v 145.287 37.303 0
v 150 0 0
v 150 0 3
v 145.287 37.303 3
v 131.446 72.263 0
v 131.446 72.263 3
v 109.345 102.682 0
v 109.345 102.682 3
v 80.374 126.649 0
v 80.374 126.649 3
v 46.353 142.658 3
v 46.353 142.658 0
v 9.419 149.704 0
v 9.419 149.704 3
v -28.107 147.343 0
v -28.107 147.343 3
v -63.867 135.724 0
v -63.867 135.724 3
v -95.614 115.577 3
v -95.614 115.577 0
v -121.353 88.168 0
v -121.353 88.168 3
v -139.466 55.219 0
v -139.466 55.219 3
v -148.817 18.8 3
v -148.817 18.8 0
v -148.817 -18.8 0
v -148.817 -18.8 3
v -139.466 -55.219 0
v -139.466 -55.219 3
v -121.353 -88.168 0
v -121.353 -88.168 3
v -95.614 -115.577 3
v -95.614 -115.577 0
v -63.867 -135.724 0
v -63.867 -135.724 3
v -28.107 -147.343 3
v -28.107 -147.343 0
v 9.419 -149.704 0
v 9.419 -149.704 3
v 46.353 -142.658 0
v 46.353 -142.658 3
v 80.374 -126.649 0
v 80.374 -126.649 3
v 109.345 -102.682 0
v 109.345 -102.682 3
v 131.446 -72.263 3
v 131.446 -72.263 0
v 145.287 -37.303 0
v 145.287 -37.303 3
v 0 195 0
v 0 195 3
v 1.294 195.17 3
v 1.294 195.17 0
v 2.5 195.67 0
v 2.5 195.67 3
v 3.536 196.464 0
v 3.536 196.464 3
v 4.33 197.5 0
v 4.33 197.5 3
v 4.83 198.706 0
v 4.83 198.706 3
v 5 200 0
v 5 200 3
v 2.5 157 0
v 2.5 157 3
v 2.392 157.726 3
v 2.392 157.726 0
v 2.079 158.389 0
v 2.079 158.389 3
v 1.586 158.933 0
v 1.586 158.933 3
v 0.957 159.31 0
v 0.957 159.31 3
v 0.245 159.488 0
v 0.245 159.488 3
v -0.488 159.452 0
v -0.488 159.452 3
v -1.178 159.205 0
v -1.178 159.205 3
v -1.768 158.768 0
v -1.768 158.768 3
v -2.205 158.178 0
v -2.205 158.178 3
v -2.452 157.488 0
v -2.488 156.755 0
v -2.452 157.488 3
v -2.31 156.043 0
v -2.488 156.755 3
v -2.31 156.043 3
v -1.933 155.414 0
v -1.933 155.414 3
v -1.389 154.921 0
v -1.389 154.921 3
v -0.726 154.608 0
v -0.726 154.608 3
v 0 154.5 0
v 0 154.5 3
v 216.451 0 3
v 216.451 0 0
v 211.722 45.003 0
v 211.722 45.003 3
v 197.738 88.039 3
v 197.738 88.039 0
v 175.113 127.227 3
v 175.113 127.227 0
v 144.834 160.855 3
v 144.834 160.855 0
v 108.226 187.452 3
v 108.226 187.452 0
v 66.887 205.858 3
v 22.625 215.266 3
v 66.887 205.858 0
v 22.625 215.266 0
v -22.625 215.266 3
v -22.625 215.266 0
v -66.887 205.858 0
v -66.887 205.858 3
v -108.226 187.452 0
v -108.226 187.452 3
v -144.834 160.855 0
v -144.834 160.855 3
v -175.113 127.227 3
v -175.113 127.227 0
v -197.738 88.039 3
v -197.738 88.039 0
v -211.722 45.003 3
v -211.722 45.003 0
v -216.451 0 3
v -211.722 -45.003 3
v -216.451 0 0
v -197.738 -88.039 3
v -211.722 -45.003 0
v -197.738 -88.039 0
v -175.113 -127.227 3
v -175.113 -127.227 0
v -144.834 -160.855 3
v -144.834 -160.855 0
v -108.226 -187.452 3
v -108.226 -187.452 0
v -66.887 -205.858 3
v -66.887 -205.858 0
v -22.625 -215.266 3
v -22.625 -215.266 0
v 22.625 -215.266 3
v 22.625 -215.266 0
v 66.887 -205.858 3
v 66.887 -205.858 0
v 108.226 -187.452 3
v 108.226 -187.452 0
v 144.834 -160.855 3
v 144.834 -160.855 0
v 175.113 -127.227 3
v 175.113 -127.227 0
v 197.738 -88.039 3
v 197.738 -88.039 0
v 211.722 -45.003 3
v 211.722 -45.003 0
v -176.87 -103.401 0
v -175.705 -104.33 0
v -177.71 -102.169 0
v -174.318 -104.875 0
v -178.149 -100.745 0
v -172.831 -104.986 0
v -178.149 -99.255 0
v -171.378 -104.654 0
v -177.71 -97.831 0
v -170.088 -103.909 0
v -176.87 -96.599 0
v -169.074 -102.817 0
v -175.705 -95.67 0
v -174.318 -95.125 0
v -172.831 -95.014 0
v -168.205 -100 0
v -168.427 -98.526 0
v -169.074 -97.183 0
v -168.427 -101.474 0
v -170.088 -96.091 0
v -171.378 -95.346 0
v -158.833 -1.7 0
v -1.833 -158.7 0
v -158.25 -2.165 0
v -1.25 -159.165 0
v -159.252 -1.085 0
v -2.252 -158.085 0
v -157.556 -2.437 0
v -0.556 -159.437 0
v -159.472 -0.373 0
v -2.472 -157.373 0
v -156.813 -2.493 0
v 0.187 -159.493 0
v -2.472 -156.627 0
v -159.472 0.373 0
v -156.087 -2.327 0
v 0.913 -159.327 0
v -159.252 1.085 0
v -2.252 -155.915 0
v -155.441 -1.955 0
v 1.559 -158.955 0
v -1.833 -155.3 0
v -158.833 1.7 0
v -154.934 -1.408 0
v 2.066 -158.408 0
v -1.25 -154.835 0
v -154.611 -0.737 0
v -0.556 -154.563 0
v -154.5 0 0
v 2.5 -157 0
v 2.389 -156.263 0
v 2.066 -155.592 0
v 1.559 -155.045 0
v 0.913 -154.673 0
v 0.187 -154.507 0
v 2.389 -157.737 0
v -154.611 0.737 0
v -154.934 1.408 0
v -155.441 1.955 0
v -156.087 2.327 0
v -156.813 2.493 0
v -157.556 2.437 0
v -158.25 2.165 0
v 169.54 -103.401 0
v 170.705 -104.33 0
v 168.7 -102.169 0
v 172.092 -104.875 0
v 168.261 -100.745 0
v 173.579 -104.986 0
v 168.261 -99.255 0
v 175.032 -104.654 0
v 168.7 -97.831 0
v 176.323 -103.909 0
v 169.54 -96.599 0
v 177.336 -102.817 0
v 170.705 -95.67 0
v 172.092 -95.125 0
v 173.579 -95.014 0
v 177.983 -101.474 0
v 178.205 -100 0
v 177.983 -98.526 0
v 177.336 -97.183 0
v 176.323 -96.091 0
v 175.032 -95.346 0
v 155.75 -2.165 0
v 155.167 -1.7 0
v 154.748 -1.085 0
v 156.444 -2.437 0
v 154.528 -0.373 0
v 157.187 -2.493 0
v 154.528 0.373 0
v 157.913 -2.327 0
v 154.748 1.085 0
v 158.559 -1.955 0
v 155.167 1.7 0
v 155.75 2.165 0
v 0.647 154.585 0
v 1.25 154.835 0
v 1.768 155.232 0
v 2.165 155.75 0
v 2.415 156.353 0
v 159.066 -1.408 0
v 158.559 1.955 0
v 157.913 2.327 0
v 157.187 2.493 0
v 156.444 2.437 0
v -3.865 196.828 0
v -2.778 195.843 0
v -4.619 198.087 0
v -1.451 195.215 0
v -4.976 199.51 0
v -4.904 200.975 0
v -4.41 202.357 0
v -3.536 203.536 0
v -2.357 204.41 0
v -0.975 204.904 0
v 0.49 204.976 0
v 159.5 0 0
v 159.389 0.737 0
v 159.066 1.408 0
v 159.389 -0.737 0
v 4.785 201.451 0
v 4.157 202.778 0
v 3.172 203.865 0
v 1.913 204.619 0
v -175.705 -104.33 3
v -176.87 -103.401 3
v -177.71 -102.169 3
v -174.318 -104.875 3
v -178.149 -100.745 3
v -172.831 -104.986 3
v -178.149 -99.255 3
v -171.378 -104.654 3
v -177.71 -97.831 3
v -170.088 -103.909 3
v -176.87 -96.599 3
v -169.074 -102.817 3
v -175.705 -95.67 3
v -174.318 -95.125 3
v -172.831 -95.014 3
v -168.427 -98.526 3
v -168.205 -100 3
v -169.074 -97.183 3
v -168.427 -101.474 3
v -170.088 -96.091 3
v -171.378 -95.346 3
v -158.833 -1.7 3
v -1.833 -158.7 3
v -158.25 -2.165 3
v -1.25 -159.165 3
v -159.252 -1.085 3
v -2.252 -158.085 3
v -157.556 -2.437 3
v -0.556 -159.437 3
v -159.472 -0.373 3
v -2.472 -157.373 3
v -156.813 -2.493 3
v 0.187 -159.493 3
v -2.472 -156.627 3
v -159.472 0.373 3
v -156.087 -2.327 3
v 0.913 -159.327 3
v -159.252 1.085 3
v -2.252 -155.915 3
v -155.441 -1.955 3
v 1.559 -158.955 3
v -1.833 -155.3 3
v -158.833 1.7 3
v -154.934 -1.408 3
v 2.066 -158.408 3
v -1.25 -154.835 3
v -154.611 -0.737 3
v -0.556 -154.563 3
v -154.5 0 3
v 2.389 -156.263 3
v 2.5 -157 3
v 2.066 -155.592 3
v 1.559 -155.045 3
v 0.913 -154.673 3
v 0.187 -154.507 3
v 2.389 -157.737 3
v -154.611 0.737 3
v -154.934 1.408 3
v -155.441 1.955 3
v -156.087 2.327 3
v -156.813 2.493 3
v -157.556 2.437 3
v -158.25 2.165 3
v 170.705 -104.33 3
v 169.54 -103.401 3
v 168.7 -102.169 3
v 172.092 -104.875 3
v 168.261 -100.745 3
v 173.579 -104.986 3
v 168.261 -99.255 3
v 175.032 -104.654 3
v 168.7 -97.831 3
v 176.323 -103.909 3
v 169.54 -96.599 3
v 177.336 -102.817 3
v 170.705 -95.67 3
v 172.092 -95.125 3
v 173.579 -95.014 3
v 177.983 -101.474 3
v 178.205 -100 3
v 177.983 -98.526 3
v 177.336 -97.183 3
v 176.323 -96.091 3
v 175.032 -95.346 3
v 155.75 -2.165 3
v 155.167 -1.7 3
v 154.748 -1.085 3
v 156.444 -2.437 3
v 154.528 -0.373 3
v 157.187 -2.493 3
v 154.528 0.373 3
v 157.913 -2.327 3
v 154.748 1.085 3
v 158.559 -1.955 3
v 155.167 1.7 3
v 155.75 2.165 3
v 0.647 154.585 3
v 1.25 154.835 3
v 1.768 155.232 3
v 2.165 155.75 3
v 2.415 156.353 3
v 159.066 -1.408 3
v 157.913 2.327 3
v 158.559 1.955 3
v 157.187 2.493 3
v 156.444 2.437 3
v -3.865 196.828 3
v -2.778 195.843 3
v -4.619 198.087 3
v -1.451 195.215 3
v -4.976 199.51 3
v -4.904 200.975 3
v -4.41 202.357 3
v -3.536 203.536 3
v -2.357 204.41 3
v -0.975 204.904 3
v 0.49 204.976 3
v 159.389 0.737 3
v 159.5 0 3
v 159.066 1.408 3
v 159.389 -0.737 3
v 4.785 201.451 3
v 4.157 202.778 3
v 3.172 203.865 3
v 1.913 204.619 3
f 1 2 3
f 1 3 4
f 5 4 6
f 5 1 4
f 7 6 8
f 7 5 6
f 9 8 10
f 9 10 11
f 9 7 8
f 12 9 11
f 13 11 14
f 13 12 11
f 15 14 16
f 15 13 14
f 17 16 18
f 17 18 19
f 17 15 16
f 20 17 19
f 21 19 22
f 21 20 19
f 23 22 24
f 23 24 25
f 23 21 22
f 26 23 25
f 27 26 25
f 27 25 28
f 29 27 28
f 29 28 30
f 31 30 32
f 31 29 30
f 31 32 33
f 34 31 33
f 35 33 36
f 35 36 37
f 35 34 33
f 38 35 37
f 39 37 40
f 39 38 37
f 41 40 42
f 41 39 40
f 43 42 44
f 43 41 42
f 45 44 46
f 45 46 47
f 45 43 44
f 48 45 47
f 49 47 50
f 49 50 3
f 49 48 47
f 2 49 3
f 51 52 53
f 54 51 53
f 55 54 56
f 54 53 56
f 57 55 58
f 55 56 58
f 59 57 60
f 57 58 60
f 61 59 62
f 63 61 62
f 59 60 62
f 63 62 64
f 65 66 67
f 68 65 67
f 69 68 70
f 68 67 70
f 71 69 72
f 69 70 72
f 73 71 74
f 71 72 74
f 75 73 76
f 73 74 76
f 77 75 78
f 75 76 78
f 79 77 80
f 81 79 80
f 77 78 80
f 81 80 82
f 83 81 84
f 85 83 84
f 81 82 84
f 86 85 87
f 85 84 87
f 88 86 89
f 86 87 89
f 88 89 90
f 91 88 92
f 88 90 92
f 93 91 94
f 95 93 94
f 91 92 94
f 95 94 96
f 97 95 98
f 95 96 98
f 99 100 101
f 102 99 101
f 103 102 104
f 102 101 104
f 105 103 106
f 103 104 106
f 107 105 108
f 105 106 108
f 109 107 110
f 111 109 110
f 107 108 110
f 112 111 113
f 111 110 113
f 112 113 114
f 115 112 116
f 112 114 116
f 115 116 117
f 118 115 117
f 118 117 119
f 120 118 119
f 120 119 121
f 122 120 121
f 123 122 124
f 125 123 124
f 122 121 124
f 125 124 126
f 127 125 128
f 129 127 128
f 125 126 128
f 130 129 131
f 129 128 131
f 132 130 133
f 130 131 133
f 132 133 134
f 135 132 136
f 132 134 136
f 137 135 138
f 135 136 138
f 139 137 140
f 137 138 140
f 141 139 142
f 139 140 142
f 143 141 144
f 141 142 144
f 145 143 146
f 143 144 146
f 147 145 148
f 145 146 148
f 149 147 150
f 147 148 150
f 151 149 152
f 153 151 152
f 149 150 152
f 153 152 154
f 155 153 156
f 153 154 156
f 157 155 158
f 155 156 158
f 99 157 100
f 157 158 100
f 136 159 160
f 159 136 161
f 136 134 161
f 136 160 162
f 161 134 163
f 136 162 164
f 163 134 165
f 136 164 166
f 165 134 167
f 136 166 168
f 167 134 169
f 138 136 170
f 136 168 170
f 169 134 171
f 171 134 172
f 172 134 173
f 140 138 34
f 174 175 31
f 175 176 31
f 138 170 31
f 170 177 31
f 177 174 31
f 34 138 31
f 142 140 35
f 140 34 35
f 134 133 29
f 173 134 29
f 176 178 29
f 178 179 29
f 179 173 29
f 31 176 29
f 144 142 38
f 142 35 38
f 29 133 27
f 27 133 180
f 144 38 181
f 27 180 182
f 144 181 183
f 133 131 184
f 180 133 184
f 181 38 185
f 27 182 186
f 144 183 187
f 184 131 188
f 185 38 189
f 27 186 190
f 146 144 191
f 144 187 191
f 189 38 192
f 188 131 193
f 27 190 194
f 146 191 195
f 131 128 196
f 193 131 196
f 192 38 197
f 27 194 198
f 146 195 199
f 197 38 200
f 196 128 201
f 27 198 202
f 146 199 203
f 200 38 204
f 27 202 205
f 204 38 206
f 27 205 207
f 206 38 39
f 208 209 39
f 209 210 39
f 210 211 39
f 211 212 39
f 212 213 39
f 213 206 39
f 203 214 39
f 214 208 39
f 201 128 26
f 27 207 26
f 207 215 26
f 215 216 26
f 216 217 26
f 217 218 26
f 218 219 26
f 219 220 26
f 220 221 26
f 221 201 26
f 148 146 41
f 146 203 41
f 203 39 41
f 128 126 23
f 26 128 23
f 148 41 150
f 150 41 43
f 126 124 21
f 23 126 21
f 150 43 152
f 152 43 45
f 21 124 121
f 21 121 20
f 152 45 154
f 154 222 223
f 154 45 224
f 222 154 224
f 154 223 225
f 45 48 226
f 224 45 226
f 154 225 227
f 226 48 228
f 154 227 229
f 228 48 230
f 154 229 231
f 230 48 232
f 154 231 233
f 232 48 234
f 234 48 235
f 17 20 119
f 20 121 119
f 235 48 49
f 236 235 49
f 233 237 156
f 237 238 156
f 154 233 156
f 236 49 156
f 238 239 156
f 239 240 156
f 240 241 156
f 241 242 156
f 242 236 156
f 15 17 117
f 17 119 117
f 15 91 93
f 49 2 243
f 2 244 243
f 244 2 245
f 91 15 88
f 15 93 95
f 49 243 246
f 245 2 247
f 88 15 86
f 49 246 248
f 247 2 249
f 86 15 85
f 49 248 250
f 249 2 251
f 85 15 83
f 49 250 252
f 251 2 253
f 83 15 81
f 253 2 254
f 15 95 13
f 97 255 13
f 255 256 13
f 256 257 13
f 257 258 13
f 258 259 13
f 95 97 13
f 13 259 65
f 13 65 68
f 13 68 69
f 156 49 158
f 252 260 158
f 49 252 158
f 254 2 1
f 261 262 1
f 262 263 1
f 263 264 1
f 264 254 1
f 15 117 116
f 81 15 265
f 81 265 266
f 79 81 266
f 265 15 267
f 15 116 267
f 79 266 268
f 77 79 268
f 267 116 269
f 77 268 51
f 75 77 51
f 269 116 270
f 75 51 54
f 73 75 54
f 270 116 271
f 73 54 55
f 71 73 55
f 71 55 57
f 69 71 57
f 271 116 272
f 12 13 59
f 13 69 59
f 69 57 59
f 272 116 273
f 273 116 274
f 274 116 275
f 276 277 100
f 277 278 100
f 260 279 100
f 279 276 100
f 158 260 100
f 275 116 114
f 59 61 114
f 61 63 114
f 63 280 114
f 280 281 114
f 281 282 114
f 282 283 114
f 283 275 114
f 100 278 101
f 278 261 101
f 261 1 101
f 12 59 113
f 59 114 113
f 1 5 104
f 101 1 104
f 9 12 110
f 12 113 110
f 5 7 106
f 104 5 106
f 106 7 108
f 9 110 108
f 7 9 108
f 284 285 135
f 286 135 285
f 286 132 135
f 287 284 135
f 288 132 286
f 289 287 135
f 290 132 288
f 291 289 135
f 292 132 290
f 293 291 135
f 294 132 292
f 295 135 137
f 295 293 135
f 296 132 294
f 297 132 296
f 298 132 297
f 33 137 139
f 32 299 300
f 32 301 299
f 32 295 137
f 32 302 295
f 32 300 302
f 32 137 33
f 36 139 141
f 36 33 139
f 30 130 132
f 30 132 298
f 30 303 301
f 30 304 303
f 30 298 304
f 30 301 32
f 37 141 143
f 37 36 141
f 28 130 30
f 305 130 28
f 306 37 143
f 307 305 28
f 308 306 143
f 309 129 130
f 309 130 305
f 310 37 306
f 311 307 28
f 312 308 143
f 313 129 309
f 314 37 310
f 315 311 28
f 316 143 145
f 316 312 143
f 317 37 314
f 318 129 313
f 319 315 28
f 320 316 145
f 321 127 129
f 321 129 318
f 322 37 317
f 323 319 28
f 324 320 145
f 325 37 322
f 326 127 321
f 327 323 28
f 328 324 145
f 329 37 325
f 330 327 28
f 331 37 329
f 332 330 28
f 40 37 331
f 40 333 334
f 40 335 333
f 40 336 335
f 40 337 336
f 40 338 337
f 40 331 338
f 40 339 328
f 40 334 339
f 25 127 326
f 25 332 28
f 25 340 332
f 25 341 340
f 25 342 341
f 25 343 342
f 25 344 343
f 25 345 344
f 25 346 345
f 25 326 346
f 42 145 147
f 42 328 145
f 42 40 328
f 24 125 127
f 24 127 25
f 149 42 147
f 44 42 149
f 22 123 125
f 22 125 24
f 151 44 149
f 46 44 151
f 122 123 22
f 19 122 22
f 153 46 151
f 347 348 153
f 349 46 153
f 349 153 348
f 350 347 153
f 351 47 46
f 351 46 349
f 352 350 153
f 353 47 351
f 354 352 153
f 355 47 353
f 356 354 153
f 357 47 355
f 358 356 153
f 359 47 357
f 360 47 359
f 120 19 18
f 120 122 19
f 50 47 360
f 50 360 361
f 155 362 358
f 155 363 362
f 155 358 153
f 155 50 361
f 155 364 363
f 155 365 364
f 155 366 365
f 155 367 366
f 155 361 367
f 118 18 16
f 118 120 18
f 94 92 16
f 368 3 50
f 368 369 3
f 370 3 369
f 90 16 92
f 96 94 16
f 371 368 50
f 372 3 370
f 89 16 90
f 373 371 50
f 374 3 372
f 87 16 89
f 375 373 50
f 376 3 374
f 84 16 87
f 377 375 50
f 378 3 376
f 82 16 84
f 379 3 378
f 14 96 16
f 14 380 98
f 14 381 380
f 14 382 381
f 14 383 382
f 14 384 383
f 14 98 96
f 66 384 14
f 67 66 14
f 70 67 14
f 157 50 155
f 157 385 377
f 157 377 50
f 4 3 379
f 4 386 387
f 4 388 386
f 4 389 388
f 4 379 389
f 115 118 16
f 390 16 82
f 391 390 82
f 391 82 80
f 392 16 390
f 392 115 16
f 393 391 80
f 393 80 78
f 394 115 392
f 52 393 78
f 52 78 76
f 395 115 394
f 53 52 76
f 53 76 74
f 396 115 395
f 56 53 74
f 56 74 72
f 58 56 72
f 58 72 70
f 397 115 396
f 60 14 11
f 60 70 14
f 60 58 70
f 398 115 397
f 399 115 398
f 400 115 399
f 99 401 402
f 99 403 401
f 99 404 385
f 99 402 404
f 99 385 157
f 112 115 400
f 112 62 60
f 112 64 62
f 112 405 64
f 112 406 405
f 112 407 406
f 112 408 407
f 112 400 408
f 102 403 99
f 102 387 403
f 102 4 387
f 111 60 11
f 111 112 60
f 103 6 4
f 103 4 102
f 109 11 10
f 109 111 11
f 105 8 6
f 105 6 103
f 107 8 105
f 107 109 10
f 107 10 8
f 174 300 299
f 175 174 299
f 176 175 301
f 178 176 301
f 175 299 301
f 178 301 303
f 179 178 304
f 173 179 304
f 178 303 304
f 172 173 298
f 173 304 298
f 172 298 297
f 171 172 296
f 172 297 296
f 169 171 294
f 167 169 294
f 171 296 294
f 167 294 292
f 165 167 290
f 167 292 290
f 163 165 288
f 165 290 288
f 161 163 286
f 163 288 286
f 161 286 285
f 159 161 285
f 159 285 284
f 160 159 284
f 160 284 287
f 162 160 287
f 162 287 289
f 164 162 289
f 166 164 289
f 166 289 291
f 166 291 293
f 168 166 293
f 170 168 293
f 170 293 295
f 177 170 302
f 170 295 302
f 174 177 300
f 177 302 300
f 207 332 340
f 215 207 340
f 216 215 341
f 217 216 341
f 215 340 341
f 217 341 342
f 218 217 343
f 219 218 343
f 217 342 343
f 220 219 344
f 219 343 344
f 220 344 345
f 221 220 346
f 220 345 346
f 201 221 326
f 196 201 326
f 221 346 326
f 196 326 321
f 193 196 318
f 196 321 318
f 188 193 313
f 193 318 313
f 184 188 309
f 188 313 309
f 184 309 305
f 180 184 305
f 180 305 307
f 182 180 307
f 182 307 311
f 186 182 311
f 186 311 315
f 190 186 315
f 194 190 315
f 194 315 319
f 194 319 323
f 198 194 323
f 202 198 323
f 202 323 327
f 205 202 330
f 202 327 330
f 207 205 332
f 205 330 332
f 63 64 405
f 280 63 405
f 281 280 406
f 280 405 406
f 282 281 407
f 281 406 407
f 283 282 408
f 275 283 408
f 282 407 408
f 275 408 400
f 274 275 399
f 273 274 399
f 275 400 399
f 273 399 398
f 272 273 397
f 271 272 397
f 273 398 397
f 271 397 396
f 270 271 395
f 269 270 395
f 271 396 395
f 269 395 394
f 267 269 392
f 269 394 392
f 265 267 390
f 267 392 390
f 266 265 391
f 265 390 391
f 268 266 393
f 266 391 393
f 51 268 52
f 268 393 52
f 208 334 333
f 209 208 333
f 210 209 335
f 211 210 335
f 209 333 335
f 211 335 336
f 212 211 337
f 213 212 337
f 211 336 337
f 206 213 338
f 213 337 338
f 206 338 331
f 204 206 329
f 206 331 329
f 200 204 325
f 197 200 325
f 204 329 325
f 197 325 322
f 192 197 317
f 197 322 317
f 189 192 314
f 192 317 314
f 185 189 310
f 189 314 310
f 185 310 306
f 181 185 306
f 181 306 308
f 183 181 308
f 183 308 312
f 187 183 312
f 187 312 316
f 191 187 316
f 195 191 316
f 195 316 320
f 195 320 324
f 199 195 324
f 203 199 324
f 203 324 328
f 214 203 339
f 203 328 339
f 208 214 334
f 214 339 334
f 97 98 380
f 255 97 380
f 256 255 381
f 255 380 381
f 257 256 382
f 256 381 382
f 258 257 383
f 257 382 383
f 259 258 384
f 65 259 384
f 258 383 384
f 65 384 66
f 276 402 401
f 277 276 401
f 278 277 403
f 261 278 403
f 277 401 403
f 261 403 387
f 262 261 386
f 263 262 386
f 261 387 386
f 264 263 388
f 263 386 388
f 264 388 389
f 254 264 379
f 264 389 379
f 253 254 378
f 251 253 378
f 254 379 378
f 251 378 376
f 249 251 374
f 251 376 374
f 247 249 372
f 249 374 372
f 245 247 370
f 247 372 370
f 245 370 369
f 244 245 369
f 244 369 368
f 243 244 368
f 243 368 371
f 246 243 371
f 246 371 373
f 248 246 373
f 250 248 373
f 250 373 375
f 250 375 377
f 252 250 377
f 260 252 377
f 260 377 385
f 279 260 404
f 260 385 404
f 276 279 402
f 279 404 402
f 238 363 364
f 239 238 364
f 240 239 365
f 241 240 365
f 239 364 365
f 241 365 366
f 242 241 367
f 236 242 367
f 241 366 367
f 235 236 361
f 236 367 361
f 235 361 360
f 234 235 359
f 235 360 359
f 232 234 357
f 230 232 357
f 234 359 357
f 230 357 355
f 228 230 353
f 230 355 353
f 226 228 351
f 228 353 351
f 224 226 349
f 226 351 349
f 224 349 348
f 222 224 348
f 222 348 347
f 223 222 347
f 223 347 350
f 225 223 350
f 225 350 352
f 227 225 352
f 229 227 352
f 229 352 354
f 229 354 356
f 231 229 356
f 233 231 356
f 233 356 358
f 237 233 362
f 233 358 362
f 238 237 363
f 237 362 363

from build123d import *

# Parameters (mm, degrees)
F0_R     = 216.451493
F0_R_2   = 150
F1_DEPTH = 3
F2_R     = 5
F3_DEPTH = 3
F4_R     = 2.5
F5_DEPTH = 3


with BuildPart() as f1:
    # F0 (on Top) → F1 (new body)
    with BuildSketch(Plane.XY):
        Circle(F0_R)
        Circle(F0_R_2, mode=Mode.SUBTRACT)
    extrude(amount=F1_DEPTH)

    # F2 (on face) → F3 (cut)
    with BuildSketch(Plane.XY.offset(3)):
        with BuildLine():
            ThreePointArc((0, 195), (3.535534, 196.464466), (5, 200))
            ThreePointArc((5, 200), (-3.535534, 203.535534), (0, 195))
        make_face()
        with Locations((-173.205081, -100)):
            Circle(F2_R)
        with Locations((173.205081, -100)):
            Circle(F2_R)
    extrude(amount=-F3_DEPTH, mode=Mode.SUBTRACT)

    # F4 (on face) → F5 (cut)
    with BuildSketch(Plane.XY.offset(3)):
        with BuildLine():
            ThreePointArc((0, 154.5), (1.767767, 155.232233), (2.5, 157))
            ThreePointArc((2.5, 157), (-1.767767, 158.767767), (0, 154.5))
        make_face()
        with Locations((-157, 0)):
            Circle(F4_R)
        with Locations((0, -157)):
            Circle(F4_R)
        with Locations((157, 0)):
            Circle(F4_R)
    extrude(amount=-F5_DEPTH, mode=Mode.SUBTRACT)


solid = f1.part
